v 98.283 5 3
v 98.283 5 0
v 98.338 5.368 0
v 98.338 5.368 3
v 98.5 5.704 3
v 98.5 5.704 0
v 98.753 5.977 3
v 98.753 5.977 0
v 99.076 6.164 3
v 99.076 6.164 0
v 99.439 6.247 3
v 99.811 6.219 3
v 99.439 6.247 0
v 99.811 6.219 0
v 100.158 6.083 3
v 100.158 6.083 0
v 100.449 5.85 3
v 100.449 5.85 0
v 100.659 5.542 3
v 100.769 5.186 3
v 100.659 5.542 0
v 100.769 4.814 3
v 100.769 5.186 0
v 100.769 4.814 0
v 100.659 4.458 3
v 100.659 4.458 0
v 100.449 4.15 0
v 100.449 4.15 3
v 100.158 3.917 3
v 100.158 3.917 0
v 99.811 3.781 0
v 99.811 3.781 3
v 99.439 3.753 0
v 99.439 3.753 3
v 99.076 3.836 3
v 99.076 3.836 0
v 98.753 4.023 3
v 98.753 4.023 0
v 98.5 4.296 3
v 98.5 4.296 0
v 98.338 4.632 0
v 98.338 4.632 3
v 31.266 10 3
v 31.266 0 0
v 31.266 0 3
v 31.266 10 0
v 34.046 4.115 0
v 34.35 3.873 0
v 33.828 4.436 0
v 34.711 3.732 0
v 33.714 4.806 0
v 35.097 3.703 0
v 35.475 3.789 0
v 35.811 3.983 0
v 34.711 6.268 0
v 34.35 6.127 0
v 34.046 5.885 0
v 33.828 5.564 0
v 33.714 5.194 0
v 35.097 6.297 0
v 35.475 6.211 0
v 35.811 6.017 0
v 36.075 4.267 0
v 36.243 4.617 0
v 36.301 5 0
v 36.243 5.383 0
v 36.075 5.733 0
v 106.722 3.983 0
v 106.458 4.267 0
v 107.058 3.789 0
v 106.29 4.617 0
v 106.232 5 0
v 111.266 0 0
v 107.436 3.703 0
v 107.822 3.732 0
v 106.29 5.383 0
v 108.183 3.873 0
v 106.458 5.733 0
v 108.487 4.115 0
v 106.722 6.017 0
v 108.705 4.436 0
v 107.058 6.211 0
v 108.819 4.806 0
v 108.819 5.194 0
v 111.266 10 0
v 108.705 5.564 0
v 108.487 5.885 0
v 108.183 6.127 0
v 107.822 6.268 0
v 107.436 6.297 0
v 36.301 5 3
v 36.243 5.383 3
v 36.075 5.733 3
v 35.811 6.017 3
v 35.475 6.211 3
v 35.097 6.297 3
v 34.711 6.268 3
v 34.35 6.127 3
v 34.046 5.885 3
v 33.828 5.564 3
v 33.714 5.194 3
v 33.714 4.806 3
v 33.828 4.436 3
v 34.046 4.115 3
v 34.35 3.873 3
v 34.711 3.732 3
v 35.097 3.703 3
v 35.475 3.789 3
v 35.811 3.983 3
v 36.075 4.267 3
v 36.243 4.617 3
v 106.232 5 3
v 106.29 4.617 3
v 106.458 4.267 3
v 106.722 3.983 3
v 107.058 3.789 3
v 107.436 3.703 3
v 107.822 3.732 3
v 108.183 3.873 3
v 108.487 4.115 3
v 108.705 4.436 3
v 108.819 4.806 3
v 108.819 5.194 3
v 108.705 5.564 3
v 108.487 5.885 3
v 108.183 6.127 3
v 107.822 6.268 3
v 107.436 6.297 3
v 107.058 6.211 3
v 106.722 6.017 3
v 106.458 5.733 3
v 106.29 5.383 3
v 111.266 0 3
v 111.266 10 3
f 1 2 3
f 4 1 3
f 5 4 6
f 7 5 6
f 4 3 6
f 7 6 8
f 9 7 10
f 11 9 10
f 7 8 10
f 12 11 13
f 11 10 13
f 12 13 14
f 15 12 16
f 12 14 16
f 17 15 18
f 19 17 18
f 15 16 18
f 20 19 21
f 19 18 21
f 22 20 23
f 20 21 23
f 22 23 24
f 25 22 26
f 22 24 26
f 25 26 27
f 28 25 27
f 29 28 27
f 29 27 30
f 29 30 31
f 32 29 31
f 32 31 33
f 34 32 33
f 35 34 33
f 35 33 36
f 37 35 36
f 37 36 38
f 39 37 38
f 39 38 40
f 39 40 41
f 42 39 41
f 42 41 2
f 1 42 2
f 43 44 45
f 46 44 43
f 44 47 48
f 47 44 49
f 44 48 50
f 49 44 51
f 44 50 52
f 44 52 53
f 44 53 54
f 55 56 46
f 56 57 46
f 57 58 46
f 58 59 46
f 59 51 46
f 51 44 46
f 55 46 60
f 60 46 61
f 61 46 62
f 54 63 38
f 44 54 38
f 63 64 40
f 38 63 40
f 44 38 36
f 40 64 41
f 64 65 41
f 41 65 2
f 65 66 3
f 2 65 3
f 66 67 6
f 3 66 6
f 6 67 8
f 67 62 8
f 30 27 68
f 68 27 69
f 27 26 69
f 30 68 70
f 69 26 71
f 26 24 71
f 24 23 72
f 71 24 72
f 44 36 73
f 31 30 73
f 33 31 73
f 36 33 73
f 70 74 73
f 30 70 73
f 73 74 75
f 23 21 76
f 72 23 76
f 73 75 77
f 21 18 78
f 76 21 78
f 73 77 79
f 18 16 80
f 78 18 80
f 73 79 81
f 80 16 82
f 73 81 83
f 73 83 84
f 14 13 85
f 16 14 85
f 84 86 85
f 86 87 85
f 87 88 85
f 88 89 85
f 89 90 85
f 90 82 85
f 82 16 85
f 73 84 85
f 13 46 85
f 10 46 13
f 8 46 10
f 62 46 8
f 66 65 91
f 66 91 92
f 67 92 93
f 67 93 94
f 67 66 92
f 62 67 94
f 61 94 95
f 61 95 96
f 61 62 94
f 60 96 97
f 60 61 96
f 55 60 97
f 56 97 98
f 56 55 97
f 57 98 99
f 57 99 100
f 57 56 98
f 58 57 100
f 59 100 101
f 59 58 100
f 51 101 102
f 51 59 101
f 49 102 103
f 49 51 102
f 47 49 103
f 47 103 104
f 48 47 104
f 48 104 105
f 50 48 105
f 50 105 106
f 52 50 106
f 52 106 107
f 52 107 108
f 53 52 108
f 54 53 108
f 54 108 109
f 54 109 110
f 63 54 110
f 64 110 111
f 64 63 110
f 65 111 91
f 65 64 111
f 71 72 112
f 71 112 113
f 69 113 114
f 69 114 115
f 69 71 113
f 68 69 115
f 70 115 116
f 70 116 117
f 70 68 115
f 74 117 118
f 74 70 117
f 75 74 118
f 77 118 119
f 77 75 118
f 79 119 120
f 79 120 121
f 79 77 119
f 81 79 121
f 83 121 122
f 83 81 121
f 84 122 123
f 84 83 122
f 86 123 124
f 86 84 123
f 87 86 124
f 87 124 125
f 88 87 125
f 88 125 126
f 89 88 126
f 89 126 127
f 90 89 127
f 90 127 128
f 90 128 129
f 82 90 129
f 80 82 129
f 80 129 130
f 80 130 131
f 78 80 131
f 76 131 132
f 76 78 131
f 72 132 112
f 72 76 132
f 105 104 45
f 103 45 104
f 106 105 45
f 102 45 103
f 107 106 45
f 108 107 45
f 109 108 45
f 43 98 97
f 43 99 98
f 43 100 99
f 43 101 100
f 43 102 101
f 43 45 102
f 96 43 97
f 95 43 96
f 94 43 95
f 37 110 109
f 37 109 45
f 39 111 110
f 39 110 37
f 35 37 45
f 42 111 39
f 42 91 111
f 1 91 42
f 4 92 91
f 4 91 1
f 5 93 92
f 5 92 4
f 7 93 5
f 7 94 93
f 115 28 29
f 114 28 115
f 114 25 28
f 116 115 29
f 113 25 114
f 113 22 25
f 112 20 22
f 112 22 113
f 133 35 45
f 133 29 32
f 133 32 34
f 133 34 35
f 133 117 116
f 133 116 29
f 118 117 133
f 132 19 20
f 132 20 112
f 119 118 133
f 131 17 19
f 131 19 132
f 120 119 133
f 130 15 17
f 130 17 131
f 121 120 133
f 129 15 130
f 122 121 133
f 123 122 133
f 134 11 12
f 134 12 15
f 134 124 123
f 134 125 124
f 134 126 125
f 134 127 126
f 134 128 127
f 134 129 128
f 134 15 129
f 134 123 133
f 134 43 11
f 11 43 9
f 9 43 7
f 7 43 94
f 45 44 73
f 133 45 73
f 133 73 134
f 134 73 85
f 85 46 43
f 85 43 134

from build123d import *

# Parameters (mm, degrees)
SKETCH1_W             = 80
SKETCH1_H             = 10
SKETCH1_R             = 1.300963213
BOSS_EXTRUDE1_DEPTH   = 3
M3_TAPPED_HOLE1_D     = 2.5
M3_TAPPED_HOLE1_DEPTH = 7.5
M3_TAPPED_HOLE1_TIP   = 0.751075774


with BuildPart() as part:
    # Sketch1 → Boss-Extrude1 (new body)
    with BuildSketch(Plane.XY):
        with Locations((71.266417393, 5)):
            Rectangle(SKETCH1_W, SKETCH1_H)
        with Locations((35, 5)):
            Circle(SKETCH1_R, mode=Mode.SUBTRACT)
        with Locations(Location((107.532834786, 5, 0), (0, 0, 180))):
            Circle(SKETCH1_R, mode=Mode.SUBTRACT)
    extrude(amount=BOSS_EXTRUDE1_DEPTH)

    # M3 Tapped Hole1
    with Locations(Plane.XY.offset(3)):
        with Locations((99.532834786, 5)):
            Hole(M3_TAPPED_HOLE1_D / 2, depth=M3_TAPPED_HOLE1_DEPTH)
            with Locations((0, 0, -(M3_TAPPED_HOLE1_DEPTH + M3_TAPPED_HOLE1_TIP / 2))):  # 118° drill point
                Cone(0, M3_TAPPED_HOLE1_D / 2, M3_TAPPED_HOLE1_TIP, mode=Mode.SUBTRACT)


solid = part.part
